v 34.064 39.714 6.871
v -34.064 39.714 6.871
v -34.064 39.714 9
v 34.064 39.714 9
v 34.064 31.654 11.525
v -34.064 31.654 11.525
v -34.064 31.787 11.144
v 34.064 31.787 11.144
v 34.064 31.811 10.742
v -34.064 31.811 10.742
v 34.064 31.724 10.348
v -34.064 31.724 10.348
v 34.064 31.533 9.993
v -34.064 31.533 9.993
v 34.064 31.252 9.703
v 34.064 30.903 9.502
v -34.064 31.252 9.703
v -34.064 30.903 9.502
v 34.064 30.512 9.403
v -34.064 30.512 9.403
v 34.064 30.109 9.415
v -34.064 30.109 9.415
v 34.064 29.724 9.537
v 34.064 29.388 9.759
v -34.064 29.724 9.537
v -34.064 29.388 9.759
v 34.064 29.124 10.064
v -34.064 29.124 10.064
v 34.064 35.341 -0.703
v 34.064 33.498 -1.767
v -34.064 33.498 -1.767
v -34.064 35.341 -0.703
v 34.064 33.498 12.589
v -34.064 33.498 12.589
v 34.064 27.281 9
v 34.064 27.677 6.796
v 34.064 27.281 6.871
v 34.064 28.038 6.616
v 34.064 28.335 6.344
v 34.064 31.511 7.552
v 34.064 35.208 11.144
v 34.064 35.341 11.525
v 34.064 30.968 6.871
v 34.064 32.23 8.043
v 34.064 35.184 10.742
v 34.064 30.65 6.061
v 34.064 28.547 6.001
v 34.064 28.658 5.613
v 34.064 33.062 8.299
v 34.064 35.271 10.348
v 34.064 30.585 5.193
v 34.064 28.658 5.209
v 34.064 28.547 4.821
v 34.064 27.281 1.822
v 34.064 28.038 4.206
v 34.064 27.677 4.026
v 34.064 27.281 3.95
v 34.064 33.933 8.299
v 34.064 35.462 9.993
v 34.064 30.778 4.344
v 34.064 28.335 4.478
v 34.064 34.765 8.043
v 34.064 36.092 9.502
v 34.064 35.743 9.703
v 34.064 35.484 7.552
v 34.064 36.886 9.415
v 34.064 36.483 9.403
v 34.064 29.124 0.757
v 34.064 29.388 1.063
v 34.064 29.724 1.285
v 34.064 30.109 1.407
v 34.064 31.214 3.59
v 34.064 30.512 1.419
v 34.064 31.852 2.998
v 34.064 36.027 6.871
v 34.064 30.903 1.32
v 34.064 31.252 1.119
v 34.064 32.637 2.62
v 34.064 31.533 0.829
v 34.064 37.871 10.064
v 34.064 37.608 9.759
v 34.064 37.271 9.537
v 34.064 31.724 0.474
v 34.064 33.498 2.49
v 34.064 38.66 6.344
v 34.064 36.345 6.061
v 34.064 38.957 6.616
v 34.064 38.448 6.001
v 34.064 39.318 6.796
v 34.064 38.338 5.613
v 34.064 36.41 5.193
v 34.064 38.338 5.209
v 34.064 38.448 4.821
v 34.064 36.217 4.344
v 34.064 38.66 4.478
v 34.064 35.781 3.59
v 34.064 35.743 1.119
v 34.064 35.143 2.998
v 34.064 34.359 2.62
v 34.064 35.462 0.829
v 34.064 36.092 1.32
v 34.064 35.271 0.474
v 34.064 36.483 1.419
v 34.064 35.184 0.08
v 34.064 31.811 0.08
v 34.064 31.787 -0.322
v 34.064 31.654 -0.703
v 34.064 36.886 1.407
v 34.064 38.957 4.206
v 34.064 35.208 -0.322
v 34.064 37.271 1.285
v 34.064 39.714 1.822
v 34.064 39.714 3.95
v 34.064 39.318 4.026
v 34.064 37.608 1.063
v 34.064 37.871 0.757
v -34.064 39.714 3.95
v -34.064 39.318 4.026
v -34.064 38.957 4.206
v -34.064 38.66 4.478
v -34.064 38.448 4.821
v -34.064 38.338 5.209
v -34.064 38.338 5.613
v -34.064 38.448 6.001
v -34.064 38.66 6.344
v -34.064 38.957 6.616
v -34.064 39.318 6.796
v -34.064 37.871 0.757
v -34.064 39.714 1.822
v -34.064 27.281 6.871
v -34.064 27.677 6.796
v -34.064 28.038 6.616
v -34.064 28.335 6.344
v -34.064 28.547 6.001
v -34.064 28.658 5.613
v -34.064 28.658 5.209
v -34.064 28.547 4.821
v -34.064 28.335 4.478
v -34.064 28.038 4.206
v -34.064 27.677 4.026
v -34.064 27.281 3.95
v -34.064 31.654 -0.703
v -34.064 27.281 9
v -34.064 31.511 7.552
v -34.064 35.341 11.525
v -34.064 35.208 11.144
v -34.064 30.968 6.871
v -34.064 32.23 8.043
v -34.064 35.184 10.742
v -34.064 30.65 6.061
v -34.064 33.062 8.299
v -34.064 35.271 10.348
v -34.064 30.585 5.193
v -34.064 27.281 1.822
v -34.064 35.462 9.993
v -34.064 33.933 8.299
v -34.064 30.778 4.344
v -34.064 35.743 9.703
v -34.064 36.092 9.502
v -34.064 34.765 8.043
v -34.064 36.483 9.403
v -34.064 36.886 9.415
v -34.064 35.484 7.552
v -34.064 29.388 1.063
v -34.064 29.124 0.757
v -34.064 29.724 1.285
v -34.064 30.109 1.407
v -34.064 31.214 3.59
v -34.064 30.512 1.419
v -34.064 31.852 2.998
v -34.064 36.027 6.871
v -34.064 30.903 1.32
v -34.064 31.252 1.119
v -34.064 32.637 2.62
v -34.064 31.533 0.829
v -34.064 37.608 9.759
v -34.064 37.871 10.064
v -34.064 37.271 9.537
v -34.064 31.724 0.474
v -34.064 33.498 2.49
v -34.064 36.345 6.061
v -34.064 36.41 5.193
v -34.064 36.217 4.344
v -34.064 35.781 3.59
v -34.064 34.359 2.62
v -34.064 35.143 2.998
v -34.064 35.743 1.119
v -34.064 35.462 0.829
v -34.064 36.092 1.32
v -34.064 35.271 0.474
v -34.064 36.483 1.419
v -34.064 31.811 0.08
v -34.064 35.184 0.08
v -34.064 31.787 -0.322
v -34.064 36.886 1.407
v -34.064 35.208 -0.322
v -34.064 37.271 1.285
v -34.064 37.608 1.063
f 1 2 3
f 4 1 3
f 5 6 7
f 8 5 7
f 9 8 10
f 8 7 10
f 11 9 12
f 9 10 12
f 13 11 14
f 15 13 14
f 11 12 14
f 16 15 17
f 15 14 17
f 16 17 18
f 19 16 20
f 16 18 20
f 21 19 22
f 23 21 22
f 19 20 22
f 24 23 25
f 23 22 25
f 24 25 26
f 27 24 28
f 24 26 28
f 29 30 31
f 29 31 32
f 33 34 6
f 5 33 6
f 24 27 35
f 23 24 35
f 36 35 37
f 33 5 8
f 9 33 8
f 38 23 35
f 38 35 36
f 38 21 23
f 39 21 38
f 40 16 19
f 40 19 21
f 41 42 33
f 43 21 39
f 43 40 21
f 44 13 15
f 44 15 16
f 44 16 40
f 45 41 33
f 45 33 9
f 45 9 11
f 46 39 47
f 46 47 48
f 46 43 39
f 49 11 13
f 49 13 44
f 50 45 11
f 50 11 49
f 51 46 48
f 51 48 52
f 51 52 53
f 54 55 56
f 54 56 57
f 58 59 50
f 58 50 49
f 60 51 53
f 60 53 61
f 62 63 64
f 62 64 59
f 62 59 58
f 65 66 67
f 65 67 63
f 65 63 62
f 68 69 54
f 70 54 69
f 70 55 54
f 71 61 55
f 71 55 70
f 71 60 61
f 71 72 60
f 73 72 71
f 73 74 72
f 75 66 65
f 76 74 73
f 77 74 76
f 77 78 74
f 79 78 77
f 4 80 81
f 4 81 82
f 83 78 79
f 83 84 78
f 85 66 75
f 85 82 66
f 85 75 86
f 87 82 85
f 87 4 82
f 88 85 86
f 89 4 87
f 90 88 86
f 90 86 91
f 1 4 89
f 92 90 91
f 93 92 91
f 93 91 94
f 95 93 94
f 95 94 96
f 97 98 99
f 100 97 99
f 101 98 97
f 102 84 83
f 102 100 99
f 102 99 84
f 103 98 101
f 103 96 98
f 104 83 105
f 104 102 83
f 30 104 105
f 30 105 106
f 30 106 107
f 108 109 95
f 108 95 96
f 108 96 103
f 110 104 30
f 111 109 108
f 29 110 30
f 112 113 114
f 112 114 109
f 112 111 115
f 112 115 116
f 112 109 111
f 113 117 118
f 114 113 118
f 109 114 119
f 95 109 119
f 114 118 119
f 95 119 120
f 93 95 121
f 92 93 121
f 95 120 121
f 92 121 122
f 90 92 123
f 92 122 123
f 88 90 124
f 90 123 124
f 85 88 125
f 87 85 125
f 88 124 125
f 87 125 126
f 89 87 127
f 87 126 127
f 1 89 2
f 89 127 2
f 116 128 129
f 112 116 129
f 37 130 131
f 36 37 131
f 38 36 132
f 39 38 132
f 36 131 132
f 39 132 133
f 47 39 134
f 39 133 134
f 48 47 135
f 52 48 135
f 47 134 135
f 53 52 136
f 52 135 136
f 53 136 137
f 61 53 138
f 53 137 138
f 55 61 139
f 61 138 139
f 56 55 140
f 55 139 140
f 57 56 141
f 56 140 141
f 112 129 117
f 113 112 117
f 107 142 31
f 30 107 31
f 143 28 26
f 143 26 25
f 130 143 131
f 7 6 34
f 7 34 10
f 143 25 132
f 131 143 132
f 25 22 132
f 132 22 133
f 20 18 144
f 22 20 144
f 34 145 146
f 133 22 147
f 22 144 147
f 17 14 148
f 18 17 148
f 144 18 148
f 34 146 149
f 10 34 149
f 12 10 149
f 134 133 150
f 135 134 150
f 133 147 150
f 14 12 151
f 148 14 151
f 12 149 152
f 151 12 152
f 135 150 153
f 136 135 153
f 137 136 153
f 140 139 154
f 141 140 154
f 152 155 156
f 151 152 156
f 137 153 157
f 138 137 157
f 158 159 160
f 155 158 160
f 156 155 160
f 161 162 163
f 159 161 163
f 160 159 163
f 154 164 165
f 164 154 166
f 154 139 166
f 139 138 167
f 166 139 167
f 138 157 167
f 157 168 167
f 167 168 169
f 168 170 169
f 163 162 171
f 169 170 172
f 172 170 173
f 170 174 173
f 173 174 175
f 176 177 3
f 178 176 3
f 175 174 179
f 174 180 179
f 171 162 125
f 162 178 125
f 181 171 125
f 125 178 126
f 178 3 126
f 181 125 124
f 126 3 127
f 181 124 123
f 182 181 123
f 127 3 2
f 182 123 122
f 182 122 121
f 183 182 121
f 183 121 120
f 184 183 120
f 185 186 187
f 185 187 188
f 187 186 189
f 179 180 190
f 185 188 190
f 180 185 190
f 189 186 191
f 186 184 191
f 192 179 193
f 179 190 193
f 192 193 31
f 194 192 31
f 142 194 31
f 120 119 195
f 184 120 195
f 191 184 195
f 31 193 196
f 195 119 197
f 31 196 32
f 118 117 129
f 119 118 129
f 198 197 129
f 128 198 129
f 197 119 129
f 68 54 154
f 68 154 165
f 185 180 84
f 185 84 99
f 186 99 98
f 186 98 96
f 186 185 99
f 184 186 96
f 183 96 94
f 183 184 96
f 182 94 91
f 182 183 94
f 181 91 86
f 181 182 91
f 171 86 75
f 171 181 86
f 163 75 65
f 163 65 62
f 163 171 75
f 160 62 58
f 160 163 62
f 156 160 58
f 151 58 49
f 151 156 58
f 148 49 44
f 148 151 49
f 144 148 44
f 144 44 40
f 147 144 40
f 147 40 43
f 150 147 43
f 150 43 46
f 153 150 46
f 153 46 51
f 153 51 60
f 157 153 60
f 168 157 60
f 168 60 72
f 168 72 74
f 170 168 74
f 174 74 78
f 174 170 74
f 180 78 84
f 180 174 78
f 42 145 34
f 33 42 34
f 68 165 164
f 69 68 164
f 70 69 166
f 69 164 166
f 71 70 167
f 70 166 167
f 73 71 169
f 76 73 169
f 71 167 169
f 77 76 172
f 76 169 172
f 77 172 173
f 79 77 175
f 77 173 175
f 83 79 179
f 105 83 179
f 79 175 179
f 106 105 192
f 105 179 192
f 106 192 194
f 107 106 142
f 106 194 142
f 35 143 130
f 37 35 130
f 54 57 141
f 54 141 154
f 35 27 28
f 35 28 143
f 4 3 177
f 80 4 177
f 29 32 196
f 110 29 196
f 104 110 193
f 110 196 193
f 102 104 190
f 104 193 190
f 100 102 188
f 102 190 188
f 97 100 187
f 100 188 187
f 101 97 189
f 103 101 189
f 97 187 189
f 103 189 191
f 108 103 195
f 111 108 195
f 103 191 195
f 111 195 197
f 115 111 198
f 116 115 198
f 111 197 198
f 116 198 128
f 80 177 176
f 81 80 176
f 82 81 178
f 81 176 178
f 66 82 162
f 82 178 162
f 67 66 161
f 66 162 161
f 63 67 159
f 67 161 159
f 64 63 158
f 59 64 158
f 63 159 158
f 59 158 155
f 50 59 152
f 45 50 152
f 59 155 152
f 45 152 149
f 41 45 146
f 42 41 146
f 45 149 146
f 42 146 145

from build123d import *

# Parameters (mm, degrees)
BOSS_EXTRUDE1_START = -34.064
SKETCH2_R           = 2.921
BOSS_EXTRUDE1_DEPTH = 68.128


with BuildPart() as part:
    # Sketch2 → Boss-Extrude1 (new body)
    with BuildSketch(Plane(origin=(0, 0, 0), x_dir=(0, 0, -1), z_dir=(1, 0, 0)).offset(BOSS_EXTRUDE1_START)):
        with BuildLine():
            Line((-1.82176, 39.714214029), (-3.950444551, 39.714214029))
            ThreePointArc((-3.950444551, 39.714214029), (-5.410944551, 38.323564029), (-6.871444551, 39.714214029))
            Line((-6.871444551, 39.714214029), (-9.000129101, 39.714214029))
            Line((-9.000129101, 39.714214029), (-10.064471377, 37.870719131))
            ThreePointArc((-10.064471377, 37.870719131), (-9.590383149, 35.910564029), (-11.524971377, 35.341058926))
            Line((-11.524971377, 35.341058926), (-12.589313652, 33.497564029))
            Line((-12.589313652, 33.497564029), (-11.524971377, 31.654069131))
            ThreePointArc((-11.524971377, 31.654069131), (-9.590383149, 31.084564029), (-10.064471377, 29.124408926))
            Line((-10.064471377, 29.124408926), (-9.000129101, 27.280914029))
            Line((-9.000129101, 27.280914029), (-6.871444551, 27.280914029))
            ThreePointArc((-6.871444551, 27.280914029), (-5.410944551, 28.671564029), (-3.950444551, 27.280914029))
            Line((-3.950444551, 27.280914029), (-1.82176, 27.280914029))
            Line((-1.82176, 27.280914029), (-0.757417724, 29.124408926))
            ThreePointArc((-0.757417724, 29.124408926), (-1.231505952, 31.084564029), (0.703082276, 31.654069131))
            Line((0.703082276, 31.654069131), (1.767424551, 33.497564029))
            Line((1.767424551, 33.497564029), (0.703082276, 35.341058926))
            ThreePointArc((0.703082276, 35.341058926), (-1.231505952, 35.910564029), (-0.757417724, 37.870719131))
            Line((-0.757417724, 37.870719131), (-1.82176, 39.714214029))
        make_face()
        with Locations((-5.410944551, 33.497564029)):
            Circle(SKETCH2_R, mode=Mode.SUBTRACT)
    extrude(amount=BOSS_EXTRUDE1_DEPTH)


solid = part.part
